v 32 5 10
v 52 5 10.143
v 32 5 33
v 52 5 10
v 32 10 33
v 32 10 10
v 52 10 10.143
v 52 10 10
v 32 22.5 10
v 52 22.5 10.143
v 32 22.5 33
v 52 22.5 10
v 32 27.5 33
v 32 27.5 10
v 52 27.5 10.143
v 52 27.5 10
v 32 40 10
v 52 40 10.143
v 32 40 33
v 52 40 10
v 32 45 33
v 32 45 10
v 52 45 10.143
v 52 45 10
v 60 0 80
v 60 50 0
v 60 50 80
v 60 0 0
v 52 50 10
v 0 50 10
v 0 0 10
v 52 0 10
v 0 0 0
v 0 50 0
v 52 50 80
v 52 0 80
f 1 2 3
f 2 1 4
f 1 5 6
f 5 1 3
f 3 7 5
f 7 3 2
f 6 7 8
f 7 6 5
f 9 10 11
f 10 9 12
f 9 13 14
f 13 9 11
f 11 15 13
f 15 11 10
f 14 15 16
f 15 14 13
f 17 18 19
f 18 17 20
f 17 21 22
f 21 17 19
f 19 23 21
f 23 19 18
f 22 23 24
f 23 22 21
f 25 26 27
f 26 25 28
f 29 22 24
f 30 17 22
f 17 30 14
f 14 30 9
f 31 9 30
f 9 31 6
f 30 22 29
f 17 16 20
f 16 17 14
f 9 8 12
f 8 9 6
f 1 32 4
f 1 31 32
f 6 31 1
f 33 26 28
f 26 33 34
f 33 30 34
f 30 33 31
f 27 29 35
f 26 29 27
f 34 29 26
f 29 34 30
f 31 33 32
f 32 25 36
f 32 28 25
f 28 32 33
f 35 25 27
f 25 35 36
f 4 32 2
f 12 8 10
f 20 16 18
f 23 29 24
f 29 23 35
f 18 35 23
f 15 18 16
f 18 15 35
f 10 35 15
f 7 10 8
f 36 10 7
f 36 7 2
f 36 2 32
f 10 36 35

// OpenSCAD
$fn = 32;

// ----------------------------------------------------------------------
// Rib bracket: 3-gusset L bracket
// ----------------------------------------------------------------------

// --- parameters (mm) ---
base_l = 60;              // foot length, X
base_w = 50;              // foot width, Y
base_t = 10;              // foot thickness
plate_t = 8;              // upright plate thickness
plate_h = 80;             // overall height
gus_l = 20;               // gusset leg along the foot
gus_h = 24;               // gusset height
gus_t = 5;                // gusset thickness
gus_edge = 5;             // gusset margin from the foot edge
n_gus = 3;                // gusset count

gus_pitch = (base_w - 2 * gus_edge - gus_t) / (n_gus - 1);  // gusset pitch

union() {
  cube([base_l, base_w, base_t]);
  translate([base_l - plate_t, 0, base_t - 1])
    cube([plate_t, base_w, plate_h - base_t + 1]);
  for (i = [0 : n_gus - 1])
    translate([base_l - plate_t - gus_l, gus_edge + i * gus_pitch, base_t - 1])
      rotate([-90, 0, 0])
        linear_extrude(height = gus_t)
          polygon(points = [[0, 0], [gus_l + 1, 0], [0, -gus_h]]);
}
